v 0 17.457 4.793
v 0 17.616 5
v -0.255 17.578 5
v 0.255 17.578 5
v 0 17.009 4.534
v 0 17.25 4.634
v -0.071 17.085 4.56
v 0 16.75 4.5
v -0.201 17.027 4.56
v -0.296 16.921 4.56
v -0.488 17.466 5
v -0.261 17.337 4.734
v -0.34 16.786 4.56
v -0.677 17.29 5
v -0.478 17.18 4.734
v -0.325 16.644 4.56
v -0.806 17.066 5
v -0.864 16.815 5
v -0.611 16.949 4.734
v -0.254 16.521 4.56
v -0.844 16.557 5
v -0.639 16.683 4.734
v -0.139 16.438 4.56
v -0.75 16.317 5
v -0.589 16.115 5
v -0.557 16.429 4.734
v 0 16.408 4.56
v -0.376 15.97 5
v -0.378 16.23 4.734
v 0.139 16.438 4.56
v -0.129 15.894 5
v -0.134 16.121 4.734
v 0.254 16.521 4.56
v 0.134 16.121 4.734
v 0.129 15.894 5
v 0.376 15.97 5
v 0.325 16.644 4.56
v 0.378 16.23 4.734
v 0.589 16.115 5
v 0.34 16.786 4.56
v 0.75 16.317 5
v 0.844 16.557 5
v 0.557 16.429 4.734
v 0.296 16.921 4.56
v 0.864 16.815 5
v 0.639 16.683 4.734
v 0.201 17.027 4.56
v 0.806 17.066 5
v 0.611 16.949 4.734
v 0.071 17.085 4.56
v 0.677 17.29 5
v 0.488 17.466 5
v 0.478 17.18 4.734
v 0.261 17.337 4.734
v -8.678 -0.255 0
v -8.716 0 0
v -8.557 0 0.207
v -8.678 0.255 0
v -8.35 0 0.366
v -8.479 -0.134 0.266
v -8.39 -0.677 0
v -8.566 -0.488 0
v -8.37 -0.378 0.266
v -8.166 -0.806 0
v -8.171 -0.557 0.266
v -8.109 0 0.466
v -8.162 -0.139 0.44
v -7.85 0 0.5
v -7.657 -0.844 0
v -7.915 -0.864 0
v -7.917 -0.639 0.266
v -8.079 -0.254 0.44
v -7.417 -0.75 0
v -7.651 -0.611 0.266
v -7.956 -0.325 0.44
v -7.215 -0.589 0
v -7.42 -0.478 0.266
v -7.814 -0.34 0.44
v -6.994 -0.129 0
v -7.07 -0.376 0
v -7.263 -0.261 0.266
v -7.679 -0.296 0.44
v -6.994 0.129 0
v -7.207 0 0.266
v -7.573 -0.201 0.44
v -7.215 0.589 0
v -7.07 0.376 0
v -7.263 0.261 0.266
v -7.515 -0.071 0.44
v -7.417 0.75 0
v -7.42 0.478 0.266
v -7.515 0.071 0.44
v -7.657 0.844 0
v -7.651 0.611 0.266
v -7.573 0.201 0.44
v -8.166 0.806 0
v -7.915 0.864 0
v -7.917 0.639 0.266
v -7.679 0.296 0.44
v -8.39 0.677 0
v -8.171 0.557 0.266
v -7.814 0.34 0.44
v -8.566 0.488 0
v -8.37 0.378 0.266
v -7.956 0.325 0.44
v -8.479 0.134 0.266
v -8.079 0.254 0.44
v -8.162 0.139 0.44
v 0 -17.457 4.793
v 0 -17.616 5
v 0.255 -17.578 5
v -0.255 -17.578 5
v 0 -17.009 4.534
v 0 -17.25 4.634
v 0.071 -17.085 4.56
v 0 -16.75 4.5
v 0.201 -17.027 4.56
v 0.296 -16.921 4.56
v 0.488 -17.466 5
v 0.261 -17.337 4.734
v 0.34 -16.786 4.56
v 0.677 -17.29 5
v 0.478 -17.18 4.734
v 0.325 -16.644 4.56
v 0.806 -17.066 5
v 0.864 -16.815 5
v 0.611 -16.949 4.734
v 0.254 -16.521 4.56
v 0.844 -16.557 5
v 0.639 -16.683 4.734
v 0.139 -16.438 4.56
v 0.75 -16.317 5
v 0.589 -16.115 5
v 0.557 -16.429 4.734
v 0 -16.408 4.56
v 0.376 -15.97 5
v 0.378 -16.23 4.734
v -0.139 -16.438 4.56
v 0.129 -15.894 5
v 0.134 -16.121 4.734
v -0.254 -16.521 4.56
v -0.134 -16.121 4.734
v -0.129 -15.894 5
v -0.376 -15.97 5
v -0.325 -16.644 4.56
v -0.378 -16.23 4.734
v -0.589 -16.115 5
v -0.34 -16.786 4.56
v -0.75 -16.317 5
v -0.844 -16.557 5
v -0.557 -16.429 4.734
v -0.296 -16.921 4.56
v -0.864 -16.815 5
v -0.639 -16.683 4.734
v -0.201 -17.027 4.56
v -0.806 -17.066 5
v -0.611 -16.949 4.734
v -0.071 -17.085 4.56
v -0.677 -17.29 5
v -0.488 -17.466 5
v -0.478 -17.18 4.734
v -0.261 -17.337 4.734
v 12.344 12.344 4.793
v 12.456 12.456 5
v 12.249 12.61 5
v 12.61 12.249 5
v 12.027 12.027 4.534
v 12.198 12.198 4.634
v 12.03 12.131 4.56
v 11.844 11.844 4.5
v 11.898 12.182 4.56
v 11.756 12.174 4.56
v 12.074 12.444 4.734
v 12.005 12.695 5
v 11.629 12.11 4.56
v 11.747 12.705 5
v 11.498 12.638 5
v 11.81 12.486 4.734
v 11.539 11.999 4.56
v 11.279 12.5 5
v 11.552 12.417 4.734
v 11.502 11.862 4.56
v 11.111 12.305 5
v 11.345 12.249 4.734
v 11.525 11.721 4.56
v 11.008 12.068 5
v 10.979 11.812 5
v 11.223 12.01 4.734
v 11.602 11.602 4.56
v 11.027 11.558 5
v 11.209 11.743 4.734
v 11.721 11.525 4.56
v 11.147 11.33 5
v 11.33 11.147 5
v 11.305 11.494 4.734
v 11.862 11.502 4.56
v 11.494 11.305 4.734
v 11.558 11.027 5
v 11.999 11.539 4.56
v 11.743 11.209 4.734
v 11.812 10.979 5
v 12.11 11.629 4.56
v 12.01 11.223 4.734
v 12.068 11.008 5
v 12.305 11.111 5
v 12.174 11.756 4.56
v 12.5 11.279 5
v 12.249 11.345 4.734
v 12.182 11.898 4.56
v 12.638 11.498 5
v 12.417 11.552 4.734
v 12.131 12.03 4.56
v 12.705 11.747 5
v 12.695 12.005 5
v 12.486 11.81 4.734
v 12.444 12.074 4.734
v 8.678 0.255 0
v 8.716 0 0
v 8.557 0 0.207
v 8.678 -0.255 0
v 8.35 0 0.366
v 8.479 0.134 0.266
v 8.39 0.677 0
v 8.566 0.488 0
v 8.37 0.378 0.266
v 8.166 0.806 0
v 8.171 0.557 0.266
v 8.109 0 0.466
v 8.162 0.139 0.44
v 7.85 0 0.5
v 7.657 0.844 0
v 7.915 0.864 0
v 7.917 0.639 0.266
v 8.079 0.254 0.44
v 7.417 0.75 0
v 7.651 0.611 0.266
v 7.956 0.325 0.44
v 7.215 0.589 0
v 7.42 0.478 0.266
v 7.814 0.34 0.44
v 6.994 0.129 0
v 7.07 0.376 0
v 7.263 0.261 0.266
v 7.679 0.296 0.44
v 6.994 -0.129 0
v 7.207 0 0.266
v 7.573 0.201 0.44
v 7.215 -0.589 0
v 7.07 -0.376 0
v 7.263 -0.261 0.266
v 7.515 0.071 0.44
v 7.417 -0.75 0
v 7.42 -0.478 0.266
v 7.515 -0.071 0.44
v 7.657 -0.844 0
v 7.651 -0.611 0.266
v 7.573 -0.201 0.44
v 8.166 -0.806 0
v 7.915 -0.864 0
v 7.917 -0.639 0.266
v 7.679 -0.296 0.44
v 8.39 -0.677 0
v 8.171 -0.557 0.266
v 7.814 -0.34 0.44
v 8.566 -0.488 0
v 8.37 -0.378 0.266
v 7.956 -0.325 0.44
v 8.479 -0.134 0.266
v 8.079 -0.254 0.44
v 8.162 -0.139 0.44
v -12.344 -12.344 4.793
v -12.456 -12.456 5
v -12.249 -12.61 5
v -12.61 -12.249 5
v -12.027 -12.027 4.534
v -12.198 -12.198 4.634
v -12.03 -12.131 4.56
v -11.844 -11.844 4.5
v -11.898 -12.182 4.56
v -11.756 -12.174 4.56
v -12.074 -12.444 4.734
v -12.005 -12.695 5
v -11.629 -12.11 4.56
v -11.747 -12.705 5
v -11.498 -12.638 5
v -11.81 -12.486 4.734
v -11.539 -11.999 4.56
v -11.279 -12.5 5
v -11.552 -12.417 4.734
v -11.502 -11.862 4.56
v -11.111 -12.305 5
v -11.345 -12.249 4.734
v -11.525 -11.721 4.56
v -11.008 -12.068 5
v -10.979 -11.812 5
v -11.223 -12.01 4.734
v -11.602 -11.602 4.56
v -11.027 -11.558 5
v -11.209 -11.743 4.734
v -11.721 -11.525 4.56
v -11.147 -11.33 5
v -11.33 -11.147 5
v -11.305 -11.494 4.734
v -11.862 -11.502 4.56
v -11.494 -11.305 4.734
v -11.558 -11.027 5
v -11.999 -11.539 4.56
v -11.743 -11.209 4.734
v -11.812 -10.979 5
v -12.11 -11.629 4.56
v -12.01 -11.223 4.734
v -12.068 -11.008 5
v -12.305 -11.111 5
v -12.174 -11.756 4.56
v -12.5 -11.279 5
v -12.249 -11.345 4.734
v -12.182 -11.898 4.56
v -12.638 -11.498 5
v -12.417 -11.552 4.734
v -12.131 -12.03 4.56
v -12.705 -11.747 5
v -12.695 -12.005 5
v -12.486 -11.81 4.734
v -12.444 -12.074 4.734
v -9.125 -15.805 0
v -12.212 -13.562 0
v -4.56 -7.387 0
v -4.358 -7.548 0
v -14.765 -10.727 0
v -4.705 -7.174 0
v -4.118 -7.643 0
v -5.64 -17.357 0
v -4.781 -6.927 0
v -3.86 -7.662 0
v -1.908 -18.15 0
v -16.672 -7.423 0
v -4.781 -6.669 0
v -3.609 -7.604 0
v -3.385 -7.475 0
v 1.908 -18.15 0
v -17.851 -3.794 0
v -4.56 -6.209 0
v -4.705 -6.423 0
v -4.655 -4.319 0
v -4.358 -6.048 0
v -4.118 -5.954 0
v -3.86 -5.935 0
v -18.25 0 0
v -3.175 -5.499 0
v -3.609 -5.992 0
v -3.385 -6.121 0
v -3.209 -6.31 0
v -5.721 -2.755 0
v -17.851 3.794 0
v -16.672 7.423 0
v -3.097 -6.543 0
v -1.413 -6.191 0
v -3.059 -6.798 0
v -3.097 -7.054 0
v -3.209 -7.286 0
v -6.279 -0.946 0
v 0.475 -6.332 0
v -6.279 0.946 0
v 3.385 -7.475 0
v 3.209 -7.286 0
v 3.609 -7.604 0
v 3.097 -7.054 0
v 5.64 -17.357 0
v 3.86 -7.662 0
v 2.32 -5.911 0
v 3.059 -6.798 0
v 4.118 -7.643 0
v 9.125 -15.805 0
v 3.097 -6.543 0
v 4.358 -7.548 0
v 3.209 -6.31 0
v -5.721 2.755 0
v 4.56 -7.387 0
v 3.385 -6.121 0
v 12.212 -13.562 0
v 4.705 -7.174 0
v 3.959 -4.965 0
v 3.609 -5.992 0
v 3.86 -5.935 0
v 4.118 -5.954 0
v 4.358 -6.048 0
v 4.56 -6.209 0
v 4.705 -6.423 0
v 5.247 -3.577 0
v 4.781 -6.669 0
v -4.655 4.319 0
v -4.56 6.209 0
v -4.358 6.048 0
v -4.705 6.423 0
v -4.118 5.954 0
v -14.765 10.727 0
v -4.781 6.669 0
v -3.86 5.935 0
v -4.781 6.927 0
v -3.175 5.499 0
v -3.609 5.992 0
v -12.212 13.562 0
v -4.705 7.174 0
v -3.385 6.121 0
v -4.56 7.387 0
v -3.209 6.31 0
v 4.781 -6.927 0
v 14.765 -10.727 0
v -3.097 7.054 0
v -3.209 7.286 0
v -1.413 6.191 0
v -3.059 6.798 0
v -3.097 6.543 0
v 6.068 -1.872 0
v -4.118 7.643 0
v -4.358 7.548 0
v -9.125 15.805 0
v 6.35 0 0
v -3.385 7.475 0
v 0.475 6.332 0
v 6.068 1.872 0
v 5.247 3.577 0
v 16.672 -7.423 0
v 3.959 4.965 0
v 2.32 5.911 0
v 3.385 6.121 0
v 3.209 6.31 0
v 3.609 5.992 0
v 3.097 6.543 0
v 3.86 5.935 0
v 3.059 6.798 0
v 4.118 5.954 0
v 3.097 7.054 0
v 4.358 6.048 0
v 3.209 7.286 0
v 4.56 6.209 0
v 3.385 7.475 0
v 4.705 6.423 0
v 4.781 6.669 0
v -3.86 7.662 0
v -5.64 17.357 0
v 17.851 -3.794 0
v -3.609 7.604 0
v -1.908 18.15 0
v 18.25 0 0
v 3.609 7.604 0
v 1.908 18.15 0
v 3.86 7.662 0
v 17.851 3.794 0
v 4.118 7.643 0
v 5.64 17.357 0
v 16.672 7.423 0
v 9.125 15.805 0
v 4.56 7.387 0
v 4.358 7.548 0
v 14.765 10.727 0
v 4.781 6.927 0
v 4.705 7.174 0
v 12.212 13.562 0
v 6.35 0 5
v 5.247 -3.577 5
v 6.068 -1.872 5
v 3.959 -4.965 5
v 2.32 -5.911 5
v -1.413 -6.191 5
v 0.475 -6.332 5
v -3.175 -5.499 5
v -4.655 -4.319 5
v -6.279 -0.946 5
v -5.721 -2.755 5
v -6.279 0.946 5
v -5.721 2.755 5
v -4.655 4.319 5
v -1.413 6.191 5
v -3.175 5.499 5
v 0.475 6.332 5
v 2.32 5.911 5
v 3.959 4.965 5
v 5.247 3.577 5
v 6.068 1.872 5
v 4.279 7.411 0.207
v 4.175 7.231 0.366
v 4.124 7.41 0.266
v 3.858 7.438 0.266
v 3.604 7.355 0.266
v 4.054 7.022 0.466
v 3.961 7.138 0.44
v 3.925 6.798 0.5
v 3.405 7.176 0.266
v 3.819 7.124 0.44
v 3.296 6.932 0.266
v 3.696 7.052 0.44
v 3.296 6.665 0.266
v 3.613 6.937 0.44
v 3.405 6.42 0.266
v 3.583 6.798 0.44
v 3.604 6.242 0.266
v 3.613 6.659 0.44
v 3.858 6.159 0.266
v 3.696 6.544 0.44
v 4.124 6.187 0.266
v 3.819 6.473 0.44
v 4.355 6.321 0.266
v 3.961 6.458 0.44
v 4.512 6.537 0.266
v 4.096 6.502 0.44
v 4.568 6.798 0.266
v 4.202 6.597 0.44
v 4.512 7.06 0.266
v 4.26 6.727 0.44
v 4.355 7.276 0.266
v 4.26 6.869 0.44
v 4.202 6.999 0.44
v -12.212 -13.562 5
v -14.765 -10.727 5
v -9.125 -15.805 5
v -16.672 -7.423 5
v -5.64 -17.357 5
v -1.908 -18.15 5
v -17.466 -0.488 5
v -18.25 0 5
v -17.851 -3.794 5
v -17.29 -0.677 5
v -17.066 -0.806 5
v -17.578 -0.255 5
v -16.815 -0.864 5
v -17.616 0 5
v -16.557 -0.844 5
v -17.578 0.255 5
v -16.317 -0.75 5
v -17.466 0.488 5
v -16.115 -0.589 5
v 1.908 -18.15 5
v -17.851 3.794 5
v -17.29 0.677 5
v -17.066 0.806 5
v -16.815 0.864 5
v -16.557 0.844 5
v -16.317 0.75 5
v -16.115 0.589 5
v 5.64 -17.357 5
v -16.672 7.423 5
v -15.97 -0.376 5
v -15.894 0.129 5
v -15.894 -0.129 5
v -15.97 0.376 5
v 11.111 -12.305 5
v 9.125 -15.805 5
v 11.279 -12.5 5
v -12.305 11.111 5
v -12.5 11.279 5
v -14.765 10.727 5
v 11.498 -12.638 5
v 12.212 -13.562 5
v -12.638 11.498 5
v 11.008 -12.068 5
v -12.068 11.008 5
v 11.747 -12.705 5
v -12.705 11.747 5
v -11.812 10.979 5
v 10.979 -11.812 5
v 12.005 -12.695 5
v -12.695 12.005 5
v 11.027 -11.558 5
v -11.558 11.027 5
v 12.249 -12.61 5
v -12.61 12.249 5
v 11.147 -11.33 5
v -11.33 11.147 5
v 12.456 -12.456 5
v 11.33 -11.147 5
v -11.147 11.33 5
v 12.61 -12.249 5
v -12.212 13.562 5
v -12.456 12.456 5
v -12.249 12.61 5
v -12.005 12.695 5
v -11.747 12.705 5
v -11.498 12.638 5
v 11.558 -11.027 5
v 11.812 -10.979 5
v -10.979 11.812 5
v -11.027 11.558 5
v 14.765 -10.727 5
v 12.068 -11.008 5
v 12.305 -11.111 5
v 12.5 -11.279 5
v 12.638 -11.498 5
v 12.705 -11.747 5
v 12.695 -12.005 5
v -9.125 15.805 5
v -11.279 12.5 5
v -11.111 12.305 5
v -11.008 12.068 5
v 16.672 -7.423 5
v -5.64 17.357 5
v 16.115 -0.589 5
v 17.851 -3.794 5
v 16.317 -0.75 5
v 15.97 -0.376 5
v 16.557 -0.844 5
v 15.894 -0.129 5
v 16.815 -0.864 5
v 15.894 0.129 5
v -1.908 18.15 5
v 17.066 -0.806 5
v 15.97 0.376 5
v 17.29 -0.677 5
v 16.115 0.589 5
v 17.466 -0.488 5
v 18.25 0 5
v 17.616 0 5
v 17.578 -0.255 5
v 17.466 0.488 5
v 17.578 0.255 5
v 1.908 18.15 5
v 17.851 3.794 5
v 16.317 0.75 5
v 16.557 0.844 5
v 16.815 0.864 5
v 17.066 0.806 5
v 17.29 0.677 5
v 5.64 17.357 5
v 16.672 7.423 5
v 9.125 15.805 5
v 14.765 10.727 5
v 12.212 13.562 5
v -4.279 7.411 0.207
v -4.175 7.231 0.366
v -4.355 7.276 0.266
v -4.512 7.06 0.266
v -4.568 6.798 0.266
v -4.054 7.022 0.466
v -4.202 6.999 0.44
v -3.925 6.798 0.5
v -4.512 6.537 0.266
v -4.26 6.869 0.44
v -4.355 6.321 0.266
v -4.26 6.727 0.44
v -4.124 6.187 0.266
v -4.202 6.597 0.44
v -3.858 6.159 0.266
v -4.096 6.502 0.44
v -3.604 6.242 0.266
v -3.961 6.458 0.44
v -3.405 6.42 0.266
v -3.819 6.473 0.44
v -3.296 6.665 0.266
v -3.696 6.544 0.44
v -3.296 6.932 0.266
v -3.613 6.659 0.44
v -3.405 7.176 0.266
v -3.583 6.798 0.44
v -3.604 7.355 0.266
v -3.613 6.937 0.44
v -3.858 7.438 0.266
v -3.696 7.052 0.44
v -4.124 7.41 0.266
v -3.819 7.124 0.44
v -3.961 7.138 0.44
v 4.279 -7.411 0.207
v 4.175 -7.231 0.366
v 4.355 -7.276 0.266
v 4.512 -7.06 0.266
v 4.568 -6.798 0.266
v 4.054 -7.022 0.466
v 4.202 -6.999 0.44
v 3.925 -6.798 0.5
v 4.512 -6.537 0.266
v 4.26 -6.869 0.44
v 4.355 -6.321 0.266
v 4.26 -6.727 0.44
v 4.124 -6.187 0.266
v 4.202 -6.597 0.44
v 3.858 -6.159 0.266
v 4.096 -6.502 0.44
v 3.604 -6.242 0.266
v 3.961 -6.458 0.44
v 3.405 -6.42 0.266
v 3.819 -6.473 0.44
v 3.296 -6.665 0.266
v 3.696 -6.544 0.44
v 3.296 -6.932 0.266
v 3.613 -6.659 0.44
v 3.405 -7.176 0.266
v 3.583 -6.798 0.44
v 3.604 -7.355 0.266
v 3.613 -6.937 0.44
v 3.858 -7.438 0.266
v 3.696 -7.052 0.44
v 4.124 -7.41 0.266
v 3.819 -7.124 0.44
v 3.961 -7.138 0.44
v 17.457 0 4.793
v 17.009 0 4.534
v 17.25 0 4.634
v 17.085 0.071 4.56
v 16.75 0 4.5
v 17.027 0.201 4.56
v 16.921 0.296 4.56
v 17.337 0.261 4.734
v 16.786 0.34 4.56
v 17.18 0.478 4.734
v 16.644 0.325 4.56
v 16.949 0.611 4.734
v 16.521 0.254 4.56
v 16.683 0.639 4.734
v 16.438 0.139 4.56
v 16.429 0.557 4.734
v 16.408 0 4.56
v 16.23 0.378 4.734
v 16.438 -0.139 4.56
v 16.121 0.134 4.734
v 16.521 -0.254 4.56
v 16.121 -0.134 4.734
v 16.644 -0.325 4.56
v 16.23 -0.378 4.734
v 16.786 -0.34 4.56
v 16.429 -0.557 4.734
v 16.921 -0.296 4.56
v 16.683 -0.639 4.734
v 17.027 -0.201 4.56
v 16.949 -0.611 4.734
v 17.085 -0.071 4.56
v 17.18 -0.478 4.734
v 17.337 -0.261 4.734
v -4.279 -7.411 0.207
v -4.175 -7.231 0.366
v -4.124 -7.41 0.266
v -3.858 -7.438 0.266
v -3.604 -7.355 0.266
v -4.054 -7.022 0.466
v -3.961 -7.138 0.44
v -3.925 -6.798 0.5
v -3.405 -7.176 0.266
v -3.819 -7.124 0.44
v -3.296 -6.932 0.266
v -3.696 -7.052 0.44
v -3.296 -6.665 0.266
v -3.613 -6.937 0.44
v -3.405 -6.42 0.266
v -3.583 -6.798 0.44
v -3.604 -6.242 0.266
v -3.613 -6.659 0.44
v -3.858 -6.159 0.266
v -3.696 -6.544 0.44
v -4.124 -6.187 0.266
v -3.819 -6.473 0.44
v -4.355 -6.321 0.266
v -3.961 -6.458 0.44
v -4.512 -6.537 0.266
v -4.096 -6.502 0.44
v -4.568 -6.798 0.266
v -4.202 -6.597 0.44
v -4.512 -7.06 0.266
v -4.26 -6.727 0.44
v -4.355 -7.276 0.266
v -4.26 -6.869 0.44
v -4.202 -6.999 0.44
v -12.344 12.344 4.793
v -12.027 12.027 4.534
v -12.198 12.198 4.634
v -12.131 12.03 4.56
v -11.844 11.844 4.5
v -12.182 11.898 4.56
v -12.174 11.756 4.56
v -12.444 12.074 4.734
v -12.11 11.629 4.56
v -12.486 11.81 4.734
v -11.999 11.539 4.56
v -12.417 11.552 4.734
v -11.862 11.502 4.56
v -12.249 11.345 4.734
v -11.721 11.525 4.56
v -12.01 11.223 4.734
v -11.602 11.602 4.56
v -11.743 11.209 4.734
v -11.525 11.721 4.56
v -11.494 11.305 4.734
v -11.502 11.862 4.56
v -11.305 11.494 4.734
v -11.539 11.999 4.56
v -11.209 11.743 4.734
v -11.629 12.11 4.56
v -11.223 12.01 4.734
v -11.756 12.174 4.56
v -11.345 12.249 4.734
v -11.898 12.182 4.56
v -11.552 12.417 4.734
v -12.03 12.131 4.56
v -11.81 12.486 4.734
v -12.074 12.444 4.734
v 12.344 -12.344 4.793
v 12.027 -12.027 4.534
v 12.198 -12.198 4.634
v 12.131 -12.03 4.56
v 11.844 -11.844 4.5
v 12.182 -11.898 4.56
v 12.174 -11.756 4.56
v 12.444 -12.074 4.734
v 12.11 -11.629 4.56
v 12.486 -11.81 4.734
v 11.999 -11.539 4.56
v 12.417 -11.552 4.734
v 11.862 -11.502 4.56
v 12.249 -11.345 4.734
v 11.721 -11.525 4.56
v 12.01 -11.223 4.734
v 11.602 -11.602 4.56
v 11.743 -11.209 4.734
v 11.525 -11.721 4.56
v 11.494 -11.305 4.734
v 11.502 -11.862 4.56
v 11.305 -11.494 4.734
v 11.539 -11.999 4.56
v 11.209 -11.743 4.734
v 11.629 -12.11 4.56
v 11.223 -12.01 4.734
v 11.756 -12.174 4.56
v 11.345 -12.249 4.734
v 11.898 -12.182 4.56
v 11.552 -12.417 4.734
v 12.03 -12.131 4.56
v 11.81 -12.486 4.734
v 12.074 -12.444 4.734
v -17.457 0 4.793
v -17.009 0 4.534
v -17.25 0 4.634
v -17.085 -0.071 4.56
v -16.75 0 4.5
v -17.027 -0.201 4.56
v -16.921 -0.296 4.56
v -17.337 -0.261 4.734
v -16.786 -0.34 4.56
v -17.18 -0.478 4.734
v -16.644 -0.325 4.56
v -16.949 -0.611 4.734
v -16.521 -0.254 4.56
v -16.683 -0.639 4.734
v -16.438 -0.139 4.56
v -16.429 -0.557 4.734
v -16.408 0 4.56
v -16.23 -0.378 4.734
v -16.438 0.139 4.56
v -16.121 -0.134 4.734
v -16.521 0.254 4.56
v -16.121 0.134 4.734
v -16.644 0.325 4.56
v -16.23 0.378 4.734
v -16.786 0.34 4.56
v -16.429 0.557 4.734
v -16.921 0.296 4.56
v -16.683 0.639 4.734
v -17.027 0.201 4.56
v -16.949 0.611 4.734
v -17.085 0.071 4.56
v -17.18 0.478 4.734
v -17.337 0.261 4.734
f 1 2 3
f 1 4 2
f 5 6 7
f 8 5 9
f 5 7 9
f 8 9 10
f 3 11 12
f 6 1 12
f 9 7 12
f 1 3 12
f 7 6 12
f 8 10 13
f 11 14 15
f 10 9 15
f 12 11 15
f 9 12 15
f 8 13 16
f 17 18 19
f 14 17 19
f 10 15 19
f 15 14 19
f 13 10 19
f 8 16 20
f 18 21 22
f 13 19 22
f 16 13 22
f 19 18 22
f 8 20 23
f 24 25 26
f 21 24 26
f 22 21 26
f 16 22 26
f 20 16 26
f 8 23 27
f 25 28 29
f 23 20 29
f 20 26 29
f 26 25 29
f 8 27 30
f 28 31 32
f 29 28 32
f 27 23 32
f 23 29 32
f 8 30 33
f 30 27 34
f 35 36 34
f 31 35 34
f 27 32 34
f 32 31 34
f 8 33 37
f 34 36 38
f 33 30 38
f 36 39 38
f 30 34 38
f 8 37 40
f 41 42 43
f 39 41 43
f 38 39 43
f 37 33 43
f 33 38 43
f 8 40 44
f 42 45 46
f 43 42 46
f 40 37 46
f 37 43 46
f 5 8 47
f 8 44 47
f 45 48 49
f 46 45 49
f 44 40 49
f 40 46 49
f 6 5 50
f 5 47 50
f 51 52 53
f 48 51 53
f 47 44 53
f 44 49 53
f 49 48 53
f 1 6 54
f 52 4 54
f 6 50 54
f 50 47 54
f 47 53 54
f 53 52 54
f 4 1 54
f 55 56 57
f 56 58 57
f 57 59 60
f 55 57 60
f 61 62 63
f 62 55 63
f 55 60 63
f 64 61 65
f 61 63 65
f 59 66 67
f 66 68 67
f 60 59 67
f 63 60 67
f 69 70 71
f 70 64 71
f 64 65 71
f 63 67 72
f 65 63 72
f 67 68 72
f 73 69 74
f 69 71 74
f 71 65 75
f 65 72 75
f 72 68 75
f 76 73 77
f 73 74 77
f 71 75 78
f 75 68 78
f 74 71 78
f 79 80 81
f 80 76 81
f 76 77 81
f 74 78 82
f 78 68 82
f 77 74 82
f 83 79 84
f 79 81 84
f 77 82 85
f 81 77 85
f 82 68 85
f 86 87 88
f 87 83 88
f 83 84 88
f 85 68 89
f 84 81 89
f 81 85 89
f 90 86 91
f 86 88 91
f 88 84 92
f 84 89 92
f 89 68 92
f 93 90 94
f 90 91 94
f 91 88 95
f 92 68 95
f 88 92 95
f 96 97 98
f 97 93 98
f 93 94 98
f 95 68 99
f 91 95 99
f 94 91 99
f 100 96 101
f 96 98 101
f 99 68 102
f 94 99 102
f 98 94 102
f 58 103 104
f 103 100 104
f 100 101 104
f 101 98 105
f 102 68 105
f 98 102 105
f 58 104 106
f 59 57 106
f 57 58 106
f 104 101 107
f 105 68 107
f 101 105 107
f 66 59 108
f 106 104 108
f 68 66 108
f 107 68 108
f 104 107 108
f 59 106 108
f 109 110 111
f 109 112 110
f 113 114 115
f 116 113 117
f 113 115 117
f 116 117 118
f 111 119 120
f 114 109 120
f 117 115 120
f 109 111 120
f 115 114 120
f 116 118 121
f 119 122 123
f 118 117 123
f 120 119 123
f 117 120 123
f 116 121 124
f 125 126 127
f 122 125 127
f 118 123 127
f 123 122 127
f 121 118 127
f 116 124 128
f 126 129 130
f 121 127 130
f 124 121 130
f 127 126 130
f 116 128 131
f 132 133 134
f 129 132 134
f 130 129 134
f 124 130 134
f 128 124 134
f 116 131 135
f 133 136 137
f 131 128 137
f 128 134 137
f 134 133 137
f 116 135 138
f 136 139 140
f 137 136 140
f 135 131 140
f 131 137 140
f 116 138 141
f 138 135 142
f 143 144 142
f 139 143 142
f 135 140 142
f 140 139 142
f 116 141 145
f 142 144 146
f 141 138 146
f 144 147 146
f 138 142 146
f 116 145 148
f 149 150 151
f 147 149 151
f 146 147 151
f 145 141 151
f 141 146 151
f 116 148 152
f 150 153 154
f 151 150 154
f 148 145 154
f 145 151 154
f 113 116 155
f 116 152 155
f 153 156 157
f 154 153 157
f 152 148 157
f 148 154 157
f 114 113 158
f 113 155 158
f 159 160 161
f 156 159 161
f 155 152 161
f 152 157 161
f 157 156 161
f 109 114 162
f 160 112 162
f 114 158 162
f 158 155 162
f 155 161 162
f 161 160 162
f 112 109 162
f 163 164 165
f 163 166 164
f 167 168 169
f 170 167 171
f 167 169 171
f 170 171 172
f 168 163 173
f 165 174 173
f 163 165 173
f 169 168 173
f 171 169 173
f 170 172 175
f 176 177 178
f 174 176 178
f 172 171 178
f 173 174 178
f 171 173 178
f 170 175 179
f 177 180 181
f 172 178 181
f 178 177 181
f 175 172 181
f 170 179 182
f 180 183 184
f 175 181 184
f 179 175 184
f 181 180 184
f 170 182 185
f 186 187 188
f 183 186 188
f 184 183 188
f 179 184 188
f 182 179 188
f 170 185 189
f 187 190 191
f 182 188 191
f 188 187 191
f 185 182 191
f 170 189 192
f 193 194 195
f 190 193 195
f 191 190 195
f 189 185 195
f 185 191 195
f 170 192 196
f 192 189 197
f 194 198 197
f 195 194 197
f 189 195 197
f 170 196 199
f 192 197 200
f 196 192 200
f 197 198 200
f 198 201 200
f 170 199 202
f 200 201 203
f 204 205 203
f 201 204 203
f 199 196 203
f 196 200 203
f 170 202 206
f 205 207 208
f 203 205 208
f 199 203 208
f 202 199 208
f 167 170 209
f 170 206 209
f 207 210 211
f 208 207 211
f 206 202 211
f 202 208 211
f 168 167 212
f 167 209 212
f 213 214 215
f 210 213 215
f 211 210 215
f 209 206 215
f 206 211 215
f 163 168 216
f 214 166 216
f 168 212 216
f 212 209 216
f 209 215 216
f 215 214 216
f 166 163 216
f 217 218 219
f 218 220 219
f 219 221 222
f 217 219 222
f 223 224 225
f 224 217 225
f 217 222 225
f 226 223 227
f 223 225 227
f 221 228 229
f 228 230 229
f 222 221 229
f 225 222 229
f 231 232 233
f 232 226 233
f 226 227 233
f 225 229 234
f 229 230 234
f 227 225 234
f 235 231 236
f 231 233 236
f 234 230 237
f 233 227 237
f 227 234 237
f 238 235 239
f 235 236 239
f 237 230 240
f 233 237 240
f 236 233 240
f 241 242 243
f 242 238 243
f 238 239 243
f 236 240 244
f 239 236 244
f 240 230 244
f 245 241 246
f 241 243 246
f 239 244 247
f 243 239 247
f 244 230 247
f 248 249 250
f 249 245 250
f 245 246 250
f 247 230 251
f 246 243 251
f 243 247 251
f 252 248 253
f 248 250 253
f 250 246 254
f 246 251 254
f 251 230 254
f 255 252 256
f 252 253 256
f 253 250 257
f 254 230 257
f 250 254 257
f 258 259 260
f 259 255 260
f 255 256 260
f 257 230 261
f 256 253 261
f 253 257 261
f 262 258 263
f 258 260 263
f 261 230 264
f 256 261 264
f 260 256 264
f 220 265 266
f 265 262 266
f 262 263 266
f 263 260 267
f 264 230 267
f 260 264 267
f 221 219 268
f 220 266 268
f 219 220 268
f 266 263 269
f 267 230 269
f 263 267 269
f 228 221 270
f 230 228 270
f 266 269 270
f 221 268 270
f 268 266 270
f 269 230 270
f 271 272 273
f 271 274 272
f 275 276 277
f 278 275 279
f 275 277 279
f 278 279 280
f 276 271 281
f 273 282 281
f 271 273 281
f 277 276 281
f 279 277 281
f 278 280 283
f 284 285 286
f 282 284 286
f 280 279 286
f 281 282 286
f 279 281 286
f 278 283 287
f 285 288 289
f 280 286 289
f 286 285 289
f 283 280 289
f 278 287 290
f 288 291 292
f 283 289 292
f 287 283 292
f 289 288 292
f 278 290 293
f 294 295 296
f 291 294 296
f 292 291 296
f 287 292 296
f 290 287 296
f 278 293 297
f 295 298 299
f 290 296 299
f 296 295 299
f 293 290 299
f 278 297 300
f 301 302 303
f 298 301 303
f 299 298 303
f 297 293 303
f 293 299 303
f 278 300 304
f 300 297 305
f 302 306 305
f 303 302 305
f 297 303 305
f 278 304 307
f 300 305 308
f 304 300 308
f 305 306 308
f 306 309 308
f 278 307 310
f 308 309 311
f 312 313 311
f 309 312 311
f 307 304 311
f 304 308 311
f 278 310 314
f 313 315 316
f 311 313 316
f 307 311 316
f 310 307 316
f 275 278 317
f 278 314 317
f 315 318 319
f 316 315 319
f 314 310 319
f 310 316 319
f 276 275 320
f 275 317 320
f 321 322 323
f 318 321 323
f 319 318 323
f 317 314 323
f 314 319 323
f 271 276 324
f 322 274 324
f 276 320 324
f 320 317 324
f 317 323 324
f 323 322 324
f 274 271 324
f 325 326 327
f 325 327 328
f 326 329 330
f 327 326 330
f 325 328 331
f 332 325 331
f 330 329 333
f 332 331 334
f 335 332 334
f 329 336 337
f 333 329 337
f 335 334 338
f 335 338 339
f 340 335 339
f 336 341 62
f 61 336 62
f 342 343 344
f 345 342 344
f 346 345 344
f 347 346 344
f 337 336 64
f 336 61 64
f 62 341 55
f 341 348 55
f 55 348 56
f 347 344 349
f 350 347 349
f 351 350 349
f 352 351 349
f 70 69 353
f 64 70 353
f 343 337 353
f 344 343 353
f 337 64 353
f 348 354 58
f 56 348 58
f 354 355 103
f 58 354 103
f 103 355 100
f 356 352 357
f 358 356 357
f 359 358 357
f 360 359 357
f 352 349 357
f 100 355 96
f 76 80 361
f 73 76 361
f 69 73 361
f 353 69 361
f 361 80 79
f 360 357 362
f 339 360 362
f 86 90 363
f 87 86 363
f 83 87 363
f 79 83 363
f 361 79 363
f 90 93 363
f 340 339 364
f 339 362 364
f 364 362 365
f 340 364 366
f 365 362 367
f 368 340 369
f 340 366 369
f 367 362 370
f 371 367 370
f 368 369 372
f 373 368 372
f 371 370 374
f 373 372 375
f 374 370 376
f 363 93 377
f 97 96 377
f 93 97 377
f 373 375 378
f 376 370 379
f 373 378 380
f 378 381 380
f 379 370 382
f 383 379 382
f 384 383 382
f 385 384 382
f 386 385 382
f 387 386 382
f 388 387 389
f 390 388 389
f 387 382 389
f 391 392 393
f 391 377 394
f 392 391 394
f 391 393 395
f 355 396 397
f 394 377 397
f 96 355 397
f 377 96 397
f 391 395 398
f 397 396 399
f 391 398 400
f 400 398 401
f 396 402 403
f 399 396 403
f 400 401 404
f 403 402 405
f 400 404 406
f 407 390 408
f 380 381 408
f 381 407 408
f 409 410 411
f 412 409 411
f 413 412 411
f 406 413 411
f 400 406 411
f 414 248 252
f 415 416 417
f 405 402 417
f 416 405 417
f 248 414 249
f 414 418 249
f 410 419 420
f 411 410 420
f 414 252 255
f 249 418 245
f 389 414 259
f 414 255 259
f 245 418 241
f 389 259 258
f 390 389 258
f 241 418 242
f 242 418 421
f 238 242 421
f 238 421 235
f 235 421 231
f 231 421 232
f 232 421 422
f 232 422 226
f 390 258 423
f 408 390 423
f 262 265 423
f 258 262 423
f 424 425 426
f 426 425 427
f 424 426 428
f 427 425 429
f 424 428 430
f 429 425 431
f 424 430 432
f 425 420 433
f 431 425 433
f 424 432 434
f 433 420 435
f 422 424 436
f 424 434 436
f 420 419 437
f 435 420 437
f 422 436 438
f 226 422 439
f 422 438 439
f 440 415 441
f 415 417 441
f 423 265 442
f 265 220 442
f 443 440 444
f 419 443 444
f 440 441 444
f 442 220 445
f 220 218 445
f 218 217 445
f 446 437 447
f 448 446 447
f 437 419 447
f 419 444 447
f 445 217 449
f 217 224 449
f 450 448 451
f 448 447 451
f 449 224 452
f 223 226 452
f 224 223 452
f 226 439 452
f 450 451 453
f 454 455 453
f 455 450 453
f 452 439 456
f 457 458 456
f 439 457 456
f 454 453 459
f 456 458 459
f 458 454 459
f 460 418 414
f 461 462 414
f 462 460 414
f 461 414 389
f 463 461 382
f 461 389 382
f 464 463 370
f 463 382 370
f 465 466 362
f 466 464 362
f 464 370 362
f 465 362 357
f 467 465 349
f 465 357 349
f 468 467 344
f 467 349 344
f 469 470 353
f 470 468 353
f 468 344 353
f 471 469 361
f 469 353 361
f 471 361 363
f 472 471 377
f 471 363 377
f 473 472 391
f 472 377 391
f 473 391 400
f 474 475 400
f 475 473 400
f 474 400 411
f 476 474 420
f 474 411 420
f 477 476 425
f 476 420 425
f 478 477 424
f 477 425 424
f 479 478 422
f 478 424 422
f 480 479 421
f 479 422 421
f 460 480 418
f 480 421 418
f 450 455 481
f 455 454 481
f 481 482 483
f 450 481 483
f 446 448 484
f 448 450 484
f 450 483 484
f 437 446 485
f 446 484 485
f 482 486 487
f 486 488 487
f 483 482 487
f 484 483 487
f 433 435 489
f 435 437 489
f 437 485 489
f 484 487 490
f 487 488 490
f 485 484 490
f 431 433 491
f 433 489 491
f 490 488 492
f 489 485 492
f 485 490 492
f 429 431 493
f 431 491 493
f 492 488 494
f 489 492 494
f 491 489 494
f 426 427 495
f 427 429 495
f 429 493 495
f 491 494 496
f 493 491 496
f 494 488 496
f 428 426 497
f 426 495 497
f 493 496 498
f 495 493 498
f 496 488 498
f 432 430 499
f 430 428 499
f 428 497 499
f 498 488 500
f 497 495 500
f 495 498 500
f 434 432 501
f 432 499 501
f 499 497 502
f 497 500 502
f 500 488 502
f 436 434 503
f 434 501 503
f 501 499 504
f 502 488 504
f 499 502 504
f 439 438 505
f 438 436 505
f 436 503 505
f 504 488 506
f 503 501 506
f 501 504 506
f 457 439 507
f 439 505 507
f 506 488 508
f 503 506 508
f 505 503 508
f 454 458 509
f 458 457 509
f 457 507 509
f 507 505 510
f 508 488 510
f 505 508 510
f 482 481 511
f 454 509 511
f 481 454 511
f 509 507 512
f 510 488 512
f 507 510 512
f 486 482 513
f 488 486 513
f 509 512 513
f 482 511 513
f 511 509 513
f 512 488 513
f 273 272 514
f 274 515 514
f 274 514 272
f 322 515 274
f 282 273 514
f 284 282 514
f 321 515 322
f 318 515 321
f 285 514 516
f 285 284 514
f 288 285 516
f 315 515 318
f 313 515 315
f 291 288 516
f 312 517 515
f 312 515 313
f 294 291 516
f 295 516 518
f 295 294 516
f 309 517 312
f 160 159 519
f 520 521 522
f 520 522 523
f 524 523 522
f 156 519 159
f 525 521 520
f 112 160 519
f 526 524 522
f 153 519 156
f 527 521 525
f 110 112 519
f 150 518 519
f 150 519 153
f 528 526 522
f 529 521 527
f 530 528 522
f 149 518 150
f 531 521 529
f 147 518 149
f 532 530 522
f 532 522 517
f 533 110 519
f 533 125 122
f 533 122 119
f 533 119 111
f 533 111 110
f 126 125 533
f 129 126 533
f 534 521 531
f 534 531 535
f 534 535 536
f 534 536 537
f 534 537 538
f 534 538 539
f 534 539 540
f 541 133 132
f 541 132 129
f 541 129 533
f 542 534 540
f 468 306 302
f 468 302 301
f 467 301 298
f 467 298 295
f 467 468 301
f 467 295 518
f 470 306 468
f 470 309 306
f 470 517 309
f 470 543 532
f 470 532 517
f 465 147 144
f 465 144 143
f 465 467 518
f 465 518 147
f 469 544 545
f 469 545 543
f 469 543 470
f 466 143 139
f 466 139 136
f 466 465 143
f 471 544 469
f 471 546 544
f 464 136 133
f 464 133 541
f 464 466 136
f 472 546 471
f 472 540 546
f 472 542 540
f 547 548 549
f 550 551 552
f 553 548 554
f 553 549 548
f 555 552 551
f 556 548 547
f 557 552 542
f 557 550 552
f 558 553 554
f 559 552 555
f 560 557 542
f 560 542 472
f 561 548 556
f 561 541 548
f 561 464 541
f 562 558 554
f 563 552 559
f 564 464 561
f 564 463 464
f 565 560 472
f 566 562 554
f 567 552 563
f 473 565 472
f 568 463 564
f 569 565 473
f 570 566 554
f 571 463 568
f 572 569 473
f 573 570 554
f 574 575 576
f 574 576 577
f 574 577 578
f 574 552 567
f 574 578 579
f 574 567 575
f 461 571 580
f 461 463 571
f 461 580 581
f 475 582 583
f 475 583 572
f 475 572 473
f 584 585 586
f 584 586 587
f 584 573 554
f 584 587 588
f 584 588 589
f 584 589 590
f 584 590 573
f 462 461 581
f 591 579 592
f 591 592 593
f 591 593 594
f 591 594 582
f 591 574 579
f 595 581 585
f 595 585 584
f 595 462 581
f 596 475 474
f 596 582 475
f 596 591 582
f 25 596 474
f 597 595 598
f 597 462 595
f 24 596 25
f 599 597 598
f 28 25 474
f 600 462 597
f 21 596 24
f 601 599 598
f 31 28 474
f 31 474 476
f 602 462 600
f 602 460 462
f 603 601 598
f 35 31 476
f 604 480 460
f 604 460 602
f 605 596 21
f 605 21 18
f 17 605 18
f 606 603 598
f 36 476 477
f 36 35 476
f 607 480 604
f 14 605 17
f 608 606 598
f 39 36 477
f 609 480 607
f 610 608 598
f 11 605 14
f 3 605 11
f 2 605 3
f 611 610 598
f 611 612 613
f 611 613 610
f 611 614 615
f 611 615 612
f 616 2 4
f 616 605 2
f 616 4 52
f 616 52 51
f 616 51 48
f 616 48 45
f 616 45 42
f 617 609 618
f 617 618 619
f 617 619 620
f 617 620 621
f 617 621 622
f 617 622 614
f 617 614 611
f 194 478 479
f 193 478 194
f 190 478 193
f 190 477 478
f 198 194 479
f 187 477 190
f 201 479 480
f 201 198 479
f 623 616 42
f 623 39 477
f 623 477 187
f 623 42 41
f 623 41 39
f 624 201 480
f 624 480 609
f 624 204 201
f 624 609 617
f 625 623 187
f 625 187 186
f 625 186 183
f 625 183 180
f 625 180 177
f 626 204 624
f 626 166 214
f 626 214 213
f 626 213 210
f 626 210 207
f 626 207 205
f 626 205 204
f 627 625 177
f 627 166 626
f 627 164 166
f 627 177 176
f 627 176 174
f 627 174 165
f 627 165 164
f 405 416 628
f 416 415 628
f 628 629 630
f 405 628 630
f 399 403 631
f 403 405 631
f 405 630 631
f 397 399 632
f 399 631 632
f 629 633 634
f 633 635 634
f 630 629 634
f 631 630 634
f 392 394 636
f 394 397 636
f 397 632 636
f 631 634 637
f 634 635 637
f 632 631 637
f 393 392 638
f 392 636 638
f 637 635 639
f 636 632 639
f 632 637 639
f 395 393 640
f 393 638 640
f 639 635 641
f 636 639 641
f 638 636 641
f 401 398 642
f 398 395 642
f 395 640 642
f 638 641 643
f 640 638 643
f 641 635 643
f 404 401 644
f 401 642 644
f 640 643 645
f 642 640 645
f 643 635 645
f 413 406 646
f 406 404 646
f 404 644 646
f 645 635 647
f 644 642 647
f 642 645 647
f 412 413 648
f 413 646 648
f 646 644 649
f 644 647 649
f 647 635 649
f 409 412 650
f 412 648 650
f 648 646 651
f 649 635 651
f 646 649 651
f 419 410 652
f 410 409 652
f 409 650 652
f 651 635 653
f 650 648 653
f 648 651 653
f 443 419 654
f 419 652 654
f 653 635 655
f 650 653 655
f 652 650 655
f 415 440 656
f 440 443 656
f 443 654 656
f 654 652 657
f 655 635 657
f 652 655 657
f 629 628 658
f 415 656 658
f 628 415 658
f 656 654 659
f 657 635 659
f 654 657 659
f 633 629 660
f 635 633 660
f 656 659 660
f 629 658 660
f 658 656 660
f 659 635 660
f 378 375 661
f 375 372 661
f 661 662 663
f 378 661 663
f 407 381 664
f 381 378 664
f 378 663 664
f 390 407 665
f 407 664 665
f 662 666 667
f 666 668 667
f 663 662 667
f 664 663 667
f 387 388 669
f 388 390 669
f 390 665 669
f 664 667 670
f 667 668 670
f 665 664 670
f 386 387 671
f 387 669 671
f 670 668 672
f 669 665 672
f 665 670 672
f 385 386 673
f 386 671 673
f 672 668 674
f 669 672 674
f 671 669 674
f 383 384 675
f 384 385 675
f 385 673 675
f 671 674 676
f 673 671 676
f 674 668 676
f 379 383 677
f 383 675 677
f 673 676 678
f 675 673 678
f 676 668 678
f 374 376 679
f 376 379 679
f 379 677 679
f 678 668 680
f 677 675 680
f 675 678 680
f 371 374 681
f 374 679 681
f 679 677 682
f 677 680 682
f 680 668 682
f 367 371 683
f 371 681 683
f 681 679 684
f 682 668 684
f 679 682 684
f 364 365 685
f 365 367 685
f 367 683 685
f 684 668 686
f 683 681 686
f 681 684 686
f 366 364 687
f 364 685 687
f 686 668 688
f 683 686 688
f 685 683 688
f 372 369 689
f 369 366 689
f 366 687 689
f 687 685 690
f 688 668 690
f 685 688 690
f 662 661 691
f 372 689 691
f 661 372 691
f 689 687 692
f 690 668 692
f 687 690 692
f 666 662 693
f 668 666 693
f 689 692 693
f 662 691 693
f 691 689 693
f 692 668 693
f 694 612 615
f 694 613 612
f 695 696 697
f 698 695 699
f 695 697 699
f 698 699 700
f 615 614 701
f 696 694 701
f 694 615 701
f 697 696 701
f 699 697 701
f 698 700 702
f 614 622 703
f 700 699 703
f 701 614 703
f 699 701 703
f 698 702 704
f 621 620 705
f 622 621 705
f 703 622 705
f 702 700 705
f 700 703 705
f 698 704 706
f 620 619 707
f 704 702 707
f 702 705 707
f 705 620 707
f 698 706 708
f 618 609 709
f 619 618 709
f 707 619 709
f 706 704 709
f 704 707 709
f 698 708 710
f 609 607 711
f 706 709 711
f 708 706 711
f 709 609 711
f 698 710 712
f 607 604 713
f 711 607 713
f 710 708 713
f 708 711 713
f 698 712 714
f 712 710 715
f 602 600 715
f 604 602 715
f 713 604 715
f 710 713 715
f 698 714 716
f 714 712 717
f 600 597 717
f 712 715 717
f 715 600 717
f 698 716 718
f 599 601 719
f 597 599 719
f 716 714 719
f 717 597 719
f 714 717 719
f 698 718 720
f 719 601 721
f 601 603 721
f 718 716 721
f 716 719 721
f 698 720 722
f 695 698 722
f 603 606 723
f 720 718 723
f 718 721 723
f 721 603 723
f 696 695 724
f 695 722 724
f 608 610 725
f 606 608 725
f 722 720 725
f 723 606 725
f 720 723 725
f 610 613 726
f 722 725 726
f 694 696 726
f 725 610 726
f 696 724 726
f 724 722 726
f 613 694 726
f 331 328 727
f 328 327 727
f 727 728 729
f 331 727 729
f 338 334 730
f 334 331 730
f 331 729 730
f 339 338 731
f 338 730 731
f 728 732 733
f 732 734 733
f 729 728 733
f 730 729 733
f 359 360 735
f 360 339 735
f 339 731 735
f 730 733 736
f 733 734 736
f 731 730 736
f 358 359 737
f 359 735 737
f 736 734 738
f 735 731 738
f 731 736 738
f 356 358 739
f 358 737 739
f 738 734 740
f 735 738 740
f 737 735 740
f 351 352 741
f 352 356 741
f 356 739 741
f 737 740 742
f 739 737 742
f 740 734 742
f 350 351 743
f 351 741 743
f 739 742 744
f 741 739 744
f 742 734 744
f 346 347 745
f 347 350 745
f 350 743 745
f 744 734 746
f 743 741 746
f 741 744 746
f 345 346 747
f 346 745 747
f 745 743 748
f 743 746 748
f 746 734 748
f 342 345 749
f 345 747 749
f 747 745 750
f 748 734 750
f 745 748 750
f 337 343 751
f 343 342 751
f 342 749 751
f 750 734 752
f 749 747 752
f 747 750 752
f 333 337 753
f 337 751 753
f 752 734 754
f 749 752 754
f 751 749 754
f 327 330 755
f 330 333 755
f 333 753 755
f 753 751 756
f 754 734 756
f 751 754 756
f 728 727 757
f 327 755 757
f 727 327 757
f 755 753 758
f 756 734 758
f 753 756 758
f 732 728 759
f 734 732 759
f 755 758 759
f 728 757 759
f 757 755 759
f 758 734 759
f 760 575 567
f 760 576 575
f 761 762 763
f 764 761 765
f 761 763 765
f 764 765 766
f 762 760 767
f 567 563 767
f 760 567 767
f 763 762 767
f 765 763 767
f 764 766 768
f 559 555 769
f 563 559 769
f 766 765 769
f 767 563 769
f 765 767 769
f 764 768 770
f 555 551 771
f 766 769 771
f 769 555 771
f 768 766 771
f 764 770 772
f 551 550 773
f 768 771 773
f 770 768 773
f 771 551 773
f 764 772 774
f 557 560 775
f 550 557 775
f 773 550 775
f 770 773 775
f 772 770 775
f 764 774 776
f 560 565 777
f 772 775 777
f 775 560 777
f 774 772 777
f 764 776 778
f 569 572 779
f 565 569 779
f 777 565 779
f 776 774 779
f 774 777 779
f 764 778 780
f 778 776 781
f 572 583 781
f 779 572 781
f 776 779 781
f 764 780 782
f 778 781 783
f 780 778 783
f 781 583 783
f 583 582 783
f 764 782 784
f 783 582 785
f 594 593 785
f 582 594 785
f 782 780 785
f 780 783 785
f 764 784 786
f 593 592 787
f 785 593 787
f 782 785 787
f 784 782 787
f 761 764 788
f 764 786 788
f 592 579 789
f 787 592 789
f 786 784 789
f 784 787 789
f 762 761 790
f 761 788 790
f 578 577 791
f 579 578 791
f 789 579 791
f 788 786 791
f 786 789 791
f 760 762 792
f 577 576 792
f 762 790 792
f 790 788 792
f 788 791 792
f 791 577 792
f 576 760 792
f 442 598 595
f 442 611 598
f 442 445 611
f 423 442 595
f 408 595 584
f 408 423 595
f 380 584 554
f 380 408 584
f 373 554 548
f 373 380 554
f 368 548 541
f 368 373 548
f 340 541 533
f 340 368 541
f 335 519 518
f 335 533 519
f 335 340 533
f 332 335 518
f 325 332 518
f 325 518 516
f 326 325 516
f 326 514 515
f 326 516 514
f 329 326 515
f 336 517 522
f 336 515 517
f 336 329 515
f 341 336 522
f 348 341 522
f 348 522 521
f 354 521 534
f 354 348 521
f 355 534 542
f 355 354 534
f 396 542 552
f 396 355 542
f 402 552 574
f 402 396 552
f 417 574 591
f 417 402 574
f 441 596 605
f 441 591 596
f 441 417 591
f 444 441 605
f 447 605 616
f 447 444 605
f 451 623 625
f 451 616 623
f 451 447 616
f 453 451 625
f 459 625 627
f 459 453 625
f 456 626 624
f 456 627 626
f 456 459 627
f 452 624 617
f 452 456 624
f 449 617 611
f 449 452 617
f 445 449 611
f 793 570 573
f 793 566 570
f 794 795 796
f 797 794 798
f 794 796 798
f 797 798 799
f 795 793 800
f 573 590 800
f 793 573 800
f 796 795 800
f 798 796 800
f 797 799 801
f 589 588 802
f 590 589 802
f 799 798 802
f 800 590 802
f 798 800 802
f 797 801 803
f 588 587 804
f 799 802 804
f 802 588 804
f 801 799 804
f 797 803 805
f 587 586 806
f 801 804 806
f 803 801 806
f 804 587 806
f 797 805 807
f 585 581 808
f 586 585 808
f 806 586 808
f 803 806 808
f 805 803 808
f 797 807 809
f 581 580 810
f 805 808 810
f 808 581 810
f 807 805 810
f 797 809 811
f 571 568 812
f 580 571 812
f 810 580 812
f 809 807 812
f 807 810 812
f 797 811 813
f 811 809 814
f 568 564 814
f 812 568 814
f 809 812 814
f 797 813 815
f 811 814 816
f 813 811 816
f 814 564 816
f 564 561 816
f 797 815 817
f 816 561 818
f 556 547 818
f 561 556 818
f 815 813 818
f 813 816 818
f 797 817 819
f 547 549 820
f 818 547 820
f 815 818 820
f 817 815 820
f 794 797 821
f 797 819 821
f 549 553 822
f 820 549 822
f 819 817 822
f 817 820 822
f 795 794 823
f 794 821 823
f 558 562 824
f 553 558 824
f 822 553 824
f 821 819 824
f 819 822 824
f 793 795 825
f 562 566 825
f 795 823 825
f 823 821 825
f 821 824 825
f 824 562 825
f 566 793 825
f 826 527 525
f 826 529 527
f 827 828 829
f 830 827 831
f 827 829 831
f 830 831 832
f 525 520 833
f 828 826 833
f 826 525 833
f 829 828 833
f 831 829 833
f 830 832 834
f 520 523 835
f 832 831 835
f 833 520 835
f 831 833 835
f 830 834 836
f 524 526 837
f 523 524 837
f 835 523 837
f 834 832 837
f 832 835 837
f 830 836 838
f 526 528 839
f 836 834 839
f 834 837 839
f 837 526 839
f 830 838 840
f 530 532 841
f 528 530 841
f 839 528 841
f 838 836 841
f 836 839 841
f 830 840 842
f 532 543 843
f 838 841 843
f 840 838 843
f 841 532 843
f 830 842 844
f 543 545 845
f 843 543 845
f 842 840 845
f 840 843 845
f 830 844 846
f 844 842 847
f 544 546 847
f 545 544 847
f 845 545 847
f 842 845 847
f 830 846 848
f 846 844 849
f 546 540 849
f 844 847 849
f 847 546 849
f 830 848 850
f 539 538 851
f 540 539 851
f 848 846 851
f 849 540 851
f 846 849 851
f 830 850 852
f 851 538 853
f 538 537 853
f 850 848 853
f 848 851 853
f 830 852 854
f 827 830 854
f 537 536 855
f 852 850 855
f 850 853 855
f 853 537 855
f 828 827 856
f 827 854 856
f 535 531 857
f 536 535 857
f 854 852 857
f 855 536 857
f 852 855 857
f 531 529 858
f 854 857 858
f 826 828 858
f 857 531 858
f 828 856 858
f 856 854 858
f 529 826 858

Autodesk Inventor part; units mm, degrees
ref_plane "YZ Plane" through (0, 0, 0) normal (1, 0, 0) x (0, 1, 0)
ref_plane "XZ Plane" through (0, 0, 0) normal (0, 1, 0) x (-1, 0, 0)
ref_plane "XY Plane" through (0, 0, 0) normal (0, 0, 1) x (1, 0, 0)
sketch "Sketch1" plane through (0, 0, 0) normal (0, 0, 1) x (1, 0, 0)
  circle A0 centre (0, 0) radius 6.35
  circle A1 centre (0, 0) radius 18.25
  dimension "d0" = 12.7
  dimension "d1" = 36.5
extrude "Extrusion1" add sketch "Sketch1" along normal blind 5
sketch "Sketch2" plane through (0, 0, 5) normal (0, 0, 1) x (1, 0, 0)
  circle A0 centre (0, 0) radius 6.35 projected
  circle A1 centre (0, 0) radius 18.25 projected
  circle A2 centre (0, 0) radius 7.1
  dimension "d4" = 14.2
sketch "Sketch3" plane through (0, 0, 0) normal (0, 1, 0) x (-1, 0, 0)
  line L0 (6.35, 0) -> (6.35, 5) projected
  line L1 (18.25, 0) -> (18.25, 5) projected
  line L2 (-18.25, 5) -> (18.25, 5) projected
  line L3 (-18.25, 0) -> (18.25, 0) projected
  line L4 (7.85, 5) -> (7.85, 0)
  line L5 (16.75, 5) -> (16.75, 0)
  line L6 (16.75, 5) -> (16.75, 7)
  line L7 (7.85, 5) -> (7.85, 8)
  line L8 (7.85, 0) -> (7.85, -2)
  circle A0 centre (16.75, 5.5) radius 1
  line L9 (16.75, 5) -> (16.75, 4.5)
  line L10 (16.75, 5) -> (15.884, 5)
  line L11 (16.75, 5) -> (17.616, 5)
  arc A1 (15.884, 5) -> (16.75, 4.5) centre (16.75, 5.5) ccw
  arc A2 (16.75, 4.5) -> (17.616, 5) centre (16.75, 5.5) ccw
  dimension "d5" = 1.5
  dimension "d6" = 1.5
  dimension "d9" = 0.5
  dimension "d10" = 2
revolve "Revolution1" cut sketch "Sketch3" angle 360 about axis through (-16.75, 0, 5) along (0, 0, -1) picked at (17.2864, 4.9436) contours L5 L2 A0
pattern_circular "Circular Pattern1" count 8 over 360 about axis through (0, 0, 0) along (0, 0, 1) of "Revolution1"
sketch "Sketch4" plane through (0, 0, 0) normal (0, 1, 0) x (-1, 0, 0)
  line L0 (18.25, 0) -> (18.25, 5) projected
  line L1 (6.35, 0) -> (6.35, 5) projected
  line L2 (-18.25, 0) -> (18.25, 0) projected
  line L3 (-18.25, 5) -> (18.25, 5) projected
  line L4 (7.85, 5) -> (7.85, 0)
  line L5 (7.85, 0) -> (7.85, -3)
  circle A0 centre (7.85, -0.5) radius 1
  line L6 (7.85, 0) -> (7.85, 0.5)
  line L7 (7.85, 0) -> (6.984, 0)
  line L8 (7.85, 0) -> (8.716, 0)
  arc A1 (8.716, 0) -> (7.85, 0.5) centre (7.85, -0.5) ccw
  arc A2 (7.85, 0.5) -> (6.984, 0) centre (7.85, -0.5) ccw
  dimension "d15" = 1.5
  dimension "d16" = 0.5
  dimension "d17" = 2
revolve "Revolution2" cut sketch "Sketch4" angle 360 about axis through (-7.85, 0, 5) along (0, 0, -1) picked at (8.3864, 0.0564) contours L2 L4 A0
pattern_circular "Circular Pattern2" count 6 over 360 about axis through (0, 0, 0) along (0, 0, 1) of "Revolution2"
properties part number "Plate between E2 and E3"
